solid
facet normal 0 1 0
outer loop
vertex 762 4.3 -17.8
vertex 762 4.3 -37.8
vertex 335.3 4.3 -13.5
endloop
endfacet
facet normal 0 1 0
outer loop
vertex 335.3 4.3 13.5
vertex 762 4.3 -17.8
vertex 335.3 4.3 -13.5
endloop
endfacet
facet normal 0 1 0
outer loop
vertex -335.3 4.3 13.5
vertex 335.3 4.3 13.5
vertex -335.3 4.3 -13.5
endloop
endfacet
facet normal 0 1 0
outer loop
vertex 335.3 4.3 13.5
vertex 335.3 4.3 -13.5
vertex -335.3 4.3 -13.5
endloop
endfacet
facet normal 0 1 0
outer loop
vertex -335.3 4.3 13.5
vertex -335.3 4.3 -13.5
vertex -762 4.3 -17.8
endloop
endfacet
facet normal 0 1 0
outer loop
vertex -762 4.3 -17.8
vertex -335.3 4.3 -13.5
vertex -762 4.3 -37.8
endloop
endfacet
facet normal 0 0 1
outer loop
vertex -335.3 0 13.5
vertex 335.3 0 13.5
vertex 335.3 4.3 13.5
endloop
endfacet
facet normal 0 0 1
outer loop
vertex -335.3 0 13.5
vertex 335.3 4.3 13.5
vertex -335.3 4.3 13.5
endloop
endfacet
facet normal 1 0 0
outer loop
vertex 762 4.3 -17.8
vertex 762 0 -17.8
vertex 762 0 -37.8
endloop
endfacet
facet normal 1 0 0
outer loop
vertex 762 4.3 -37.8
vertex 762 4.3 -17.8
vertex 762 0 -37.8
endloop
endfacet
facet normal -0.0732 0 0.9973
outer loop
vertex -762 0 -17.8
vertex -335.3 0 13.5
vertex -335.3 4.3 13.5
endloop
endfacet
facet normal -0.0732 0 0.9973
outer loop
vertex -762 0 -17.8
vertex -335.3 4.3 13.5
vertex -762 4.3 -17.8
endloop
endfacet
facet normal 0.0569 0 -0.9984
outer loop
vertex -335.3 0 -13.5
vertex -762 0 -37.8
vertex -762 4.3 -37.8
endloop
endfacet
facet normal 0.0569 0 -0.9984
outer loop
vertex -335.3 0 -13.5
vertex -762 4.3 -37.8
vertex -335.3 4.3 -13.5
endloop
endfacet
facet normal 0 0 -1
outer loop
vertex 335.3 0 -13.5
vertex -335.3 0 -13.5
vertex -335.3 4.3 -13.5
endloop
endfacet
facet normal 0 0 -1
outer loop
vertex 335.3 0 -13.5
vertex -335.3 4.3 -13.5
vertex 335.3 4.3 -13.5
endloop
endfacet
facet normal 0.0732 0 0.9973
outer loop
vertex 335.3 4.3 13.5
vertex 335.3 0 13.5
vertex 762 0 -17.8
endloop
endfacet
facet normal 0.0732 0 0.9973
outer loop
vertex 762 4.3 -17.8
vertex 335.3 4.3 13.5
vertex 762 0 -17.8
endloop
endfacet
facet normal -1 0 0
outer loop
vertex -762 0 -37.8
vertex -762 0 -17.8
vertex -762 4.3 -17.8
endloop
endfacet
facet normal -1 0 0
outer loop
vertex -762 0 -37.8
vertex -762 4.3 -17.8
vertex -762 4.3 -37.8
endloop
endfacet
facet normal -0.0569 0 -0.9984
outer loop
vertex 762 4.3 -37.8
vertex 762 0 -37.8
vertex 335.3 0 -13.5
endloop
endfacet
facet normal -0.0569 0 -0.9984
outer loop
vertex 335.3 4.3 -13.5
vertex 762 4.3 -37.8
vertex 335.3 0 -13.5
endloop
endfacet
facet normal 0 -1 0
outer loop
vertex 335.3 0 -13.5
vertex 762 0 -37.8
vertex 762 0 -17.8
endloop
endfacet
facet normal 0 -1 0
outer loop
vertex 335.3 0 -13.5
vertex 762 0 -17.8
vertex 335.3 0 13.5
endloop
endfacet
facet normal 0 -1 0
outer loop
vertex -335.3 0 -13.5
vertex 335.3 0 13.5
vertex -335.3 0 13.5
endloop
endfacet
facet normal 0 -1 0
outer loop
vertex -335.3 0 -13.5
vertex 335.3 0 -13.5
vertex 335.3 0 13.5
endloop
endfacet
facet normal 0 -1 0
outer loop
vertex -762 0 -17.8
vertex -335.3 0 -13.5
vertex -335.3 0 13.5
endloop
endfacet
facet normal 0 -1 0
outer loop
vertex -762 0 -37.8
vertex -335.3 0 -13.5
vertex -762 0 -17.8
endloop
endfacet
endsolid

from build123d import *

# Parameters (mm, degrees)
BOSS_EXTRUDE1_DEPTH = 4.3


with BuildPart() as part:
    # Sketch1 → Boss-Extrude1 (new body)
    with BuildSketch(Plane(origin=(0, 0, 0), x_dir=(1, 0, 0), z_dir=(0, 1, 0))):
        Polygon((335.3, -13.5), (762, 17.8), (762, 37.8), (335.3, 13.5), (0, 13.5), (0, -13.5), align=None)
    boss_extrude1 = extrude(amount=BOSS_EXTRUDE1_DEPTH)

    # Mirror1: Boss-Extrude1 across plane
    add(boss_extrude1.mirror(Plane(origin=(0, 4.3, -13.5), x_dir=(0, 0, 1), z_dir=(1, 0, 0))))


solid = part.part
